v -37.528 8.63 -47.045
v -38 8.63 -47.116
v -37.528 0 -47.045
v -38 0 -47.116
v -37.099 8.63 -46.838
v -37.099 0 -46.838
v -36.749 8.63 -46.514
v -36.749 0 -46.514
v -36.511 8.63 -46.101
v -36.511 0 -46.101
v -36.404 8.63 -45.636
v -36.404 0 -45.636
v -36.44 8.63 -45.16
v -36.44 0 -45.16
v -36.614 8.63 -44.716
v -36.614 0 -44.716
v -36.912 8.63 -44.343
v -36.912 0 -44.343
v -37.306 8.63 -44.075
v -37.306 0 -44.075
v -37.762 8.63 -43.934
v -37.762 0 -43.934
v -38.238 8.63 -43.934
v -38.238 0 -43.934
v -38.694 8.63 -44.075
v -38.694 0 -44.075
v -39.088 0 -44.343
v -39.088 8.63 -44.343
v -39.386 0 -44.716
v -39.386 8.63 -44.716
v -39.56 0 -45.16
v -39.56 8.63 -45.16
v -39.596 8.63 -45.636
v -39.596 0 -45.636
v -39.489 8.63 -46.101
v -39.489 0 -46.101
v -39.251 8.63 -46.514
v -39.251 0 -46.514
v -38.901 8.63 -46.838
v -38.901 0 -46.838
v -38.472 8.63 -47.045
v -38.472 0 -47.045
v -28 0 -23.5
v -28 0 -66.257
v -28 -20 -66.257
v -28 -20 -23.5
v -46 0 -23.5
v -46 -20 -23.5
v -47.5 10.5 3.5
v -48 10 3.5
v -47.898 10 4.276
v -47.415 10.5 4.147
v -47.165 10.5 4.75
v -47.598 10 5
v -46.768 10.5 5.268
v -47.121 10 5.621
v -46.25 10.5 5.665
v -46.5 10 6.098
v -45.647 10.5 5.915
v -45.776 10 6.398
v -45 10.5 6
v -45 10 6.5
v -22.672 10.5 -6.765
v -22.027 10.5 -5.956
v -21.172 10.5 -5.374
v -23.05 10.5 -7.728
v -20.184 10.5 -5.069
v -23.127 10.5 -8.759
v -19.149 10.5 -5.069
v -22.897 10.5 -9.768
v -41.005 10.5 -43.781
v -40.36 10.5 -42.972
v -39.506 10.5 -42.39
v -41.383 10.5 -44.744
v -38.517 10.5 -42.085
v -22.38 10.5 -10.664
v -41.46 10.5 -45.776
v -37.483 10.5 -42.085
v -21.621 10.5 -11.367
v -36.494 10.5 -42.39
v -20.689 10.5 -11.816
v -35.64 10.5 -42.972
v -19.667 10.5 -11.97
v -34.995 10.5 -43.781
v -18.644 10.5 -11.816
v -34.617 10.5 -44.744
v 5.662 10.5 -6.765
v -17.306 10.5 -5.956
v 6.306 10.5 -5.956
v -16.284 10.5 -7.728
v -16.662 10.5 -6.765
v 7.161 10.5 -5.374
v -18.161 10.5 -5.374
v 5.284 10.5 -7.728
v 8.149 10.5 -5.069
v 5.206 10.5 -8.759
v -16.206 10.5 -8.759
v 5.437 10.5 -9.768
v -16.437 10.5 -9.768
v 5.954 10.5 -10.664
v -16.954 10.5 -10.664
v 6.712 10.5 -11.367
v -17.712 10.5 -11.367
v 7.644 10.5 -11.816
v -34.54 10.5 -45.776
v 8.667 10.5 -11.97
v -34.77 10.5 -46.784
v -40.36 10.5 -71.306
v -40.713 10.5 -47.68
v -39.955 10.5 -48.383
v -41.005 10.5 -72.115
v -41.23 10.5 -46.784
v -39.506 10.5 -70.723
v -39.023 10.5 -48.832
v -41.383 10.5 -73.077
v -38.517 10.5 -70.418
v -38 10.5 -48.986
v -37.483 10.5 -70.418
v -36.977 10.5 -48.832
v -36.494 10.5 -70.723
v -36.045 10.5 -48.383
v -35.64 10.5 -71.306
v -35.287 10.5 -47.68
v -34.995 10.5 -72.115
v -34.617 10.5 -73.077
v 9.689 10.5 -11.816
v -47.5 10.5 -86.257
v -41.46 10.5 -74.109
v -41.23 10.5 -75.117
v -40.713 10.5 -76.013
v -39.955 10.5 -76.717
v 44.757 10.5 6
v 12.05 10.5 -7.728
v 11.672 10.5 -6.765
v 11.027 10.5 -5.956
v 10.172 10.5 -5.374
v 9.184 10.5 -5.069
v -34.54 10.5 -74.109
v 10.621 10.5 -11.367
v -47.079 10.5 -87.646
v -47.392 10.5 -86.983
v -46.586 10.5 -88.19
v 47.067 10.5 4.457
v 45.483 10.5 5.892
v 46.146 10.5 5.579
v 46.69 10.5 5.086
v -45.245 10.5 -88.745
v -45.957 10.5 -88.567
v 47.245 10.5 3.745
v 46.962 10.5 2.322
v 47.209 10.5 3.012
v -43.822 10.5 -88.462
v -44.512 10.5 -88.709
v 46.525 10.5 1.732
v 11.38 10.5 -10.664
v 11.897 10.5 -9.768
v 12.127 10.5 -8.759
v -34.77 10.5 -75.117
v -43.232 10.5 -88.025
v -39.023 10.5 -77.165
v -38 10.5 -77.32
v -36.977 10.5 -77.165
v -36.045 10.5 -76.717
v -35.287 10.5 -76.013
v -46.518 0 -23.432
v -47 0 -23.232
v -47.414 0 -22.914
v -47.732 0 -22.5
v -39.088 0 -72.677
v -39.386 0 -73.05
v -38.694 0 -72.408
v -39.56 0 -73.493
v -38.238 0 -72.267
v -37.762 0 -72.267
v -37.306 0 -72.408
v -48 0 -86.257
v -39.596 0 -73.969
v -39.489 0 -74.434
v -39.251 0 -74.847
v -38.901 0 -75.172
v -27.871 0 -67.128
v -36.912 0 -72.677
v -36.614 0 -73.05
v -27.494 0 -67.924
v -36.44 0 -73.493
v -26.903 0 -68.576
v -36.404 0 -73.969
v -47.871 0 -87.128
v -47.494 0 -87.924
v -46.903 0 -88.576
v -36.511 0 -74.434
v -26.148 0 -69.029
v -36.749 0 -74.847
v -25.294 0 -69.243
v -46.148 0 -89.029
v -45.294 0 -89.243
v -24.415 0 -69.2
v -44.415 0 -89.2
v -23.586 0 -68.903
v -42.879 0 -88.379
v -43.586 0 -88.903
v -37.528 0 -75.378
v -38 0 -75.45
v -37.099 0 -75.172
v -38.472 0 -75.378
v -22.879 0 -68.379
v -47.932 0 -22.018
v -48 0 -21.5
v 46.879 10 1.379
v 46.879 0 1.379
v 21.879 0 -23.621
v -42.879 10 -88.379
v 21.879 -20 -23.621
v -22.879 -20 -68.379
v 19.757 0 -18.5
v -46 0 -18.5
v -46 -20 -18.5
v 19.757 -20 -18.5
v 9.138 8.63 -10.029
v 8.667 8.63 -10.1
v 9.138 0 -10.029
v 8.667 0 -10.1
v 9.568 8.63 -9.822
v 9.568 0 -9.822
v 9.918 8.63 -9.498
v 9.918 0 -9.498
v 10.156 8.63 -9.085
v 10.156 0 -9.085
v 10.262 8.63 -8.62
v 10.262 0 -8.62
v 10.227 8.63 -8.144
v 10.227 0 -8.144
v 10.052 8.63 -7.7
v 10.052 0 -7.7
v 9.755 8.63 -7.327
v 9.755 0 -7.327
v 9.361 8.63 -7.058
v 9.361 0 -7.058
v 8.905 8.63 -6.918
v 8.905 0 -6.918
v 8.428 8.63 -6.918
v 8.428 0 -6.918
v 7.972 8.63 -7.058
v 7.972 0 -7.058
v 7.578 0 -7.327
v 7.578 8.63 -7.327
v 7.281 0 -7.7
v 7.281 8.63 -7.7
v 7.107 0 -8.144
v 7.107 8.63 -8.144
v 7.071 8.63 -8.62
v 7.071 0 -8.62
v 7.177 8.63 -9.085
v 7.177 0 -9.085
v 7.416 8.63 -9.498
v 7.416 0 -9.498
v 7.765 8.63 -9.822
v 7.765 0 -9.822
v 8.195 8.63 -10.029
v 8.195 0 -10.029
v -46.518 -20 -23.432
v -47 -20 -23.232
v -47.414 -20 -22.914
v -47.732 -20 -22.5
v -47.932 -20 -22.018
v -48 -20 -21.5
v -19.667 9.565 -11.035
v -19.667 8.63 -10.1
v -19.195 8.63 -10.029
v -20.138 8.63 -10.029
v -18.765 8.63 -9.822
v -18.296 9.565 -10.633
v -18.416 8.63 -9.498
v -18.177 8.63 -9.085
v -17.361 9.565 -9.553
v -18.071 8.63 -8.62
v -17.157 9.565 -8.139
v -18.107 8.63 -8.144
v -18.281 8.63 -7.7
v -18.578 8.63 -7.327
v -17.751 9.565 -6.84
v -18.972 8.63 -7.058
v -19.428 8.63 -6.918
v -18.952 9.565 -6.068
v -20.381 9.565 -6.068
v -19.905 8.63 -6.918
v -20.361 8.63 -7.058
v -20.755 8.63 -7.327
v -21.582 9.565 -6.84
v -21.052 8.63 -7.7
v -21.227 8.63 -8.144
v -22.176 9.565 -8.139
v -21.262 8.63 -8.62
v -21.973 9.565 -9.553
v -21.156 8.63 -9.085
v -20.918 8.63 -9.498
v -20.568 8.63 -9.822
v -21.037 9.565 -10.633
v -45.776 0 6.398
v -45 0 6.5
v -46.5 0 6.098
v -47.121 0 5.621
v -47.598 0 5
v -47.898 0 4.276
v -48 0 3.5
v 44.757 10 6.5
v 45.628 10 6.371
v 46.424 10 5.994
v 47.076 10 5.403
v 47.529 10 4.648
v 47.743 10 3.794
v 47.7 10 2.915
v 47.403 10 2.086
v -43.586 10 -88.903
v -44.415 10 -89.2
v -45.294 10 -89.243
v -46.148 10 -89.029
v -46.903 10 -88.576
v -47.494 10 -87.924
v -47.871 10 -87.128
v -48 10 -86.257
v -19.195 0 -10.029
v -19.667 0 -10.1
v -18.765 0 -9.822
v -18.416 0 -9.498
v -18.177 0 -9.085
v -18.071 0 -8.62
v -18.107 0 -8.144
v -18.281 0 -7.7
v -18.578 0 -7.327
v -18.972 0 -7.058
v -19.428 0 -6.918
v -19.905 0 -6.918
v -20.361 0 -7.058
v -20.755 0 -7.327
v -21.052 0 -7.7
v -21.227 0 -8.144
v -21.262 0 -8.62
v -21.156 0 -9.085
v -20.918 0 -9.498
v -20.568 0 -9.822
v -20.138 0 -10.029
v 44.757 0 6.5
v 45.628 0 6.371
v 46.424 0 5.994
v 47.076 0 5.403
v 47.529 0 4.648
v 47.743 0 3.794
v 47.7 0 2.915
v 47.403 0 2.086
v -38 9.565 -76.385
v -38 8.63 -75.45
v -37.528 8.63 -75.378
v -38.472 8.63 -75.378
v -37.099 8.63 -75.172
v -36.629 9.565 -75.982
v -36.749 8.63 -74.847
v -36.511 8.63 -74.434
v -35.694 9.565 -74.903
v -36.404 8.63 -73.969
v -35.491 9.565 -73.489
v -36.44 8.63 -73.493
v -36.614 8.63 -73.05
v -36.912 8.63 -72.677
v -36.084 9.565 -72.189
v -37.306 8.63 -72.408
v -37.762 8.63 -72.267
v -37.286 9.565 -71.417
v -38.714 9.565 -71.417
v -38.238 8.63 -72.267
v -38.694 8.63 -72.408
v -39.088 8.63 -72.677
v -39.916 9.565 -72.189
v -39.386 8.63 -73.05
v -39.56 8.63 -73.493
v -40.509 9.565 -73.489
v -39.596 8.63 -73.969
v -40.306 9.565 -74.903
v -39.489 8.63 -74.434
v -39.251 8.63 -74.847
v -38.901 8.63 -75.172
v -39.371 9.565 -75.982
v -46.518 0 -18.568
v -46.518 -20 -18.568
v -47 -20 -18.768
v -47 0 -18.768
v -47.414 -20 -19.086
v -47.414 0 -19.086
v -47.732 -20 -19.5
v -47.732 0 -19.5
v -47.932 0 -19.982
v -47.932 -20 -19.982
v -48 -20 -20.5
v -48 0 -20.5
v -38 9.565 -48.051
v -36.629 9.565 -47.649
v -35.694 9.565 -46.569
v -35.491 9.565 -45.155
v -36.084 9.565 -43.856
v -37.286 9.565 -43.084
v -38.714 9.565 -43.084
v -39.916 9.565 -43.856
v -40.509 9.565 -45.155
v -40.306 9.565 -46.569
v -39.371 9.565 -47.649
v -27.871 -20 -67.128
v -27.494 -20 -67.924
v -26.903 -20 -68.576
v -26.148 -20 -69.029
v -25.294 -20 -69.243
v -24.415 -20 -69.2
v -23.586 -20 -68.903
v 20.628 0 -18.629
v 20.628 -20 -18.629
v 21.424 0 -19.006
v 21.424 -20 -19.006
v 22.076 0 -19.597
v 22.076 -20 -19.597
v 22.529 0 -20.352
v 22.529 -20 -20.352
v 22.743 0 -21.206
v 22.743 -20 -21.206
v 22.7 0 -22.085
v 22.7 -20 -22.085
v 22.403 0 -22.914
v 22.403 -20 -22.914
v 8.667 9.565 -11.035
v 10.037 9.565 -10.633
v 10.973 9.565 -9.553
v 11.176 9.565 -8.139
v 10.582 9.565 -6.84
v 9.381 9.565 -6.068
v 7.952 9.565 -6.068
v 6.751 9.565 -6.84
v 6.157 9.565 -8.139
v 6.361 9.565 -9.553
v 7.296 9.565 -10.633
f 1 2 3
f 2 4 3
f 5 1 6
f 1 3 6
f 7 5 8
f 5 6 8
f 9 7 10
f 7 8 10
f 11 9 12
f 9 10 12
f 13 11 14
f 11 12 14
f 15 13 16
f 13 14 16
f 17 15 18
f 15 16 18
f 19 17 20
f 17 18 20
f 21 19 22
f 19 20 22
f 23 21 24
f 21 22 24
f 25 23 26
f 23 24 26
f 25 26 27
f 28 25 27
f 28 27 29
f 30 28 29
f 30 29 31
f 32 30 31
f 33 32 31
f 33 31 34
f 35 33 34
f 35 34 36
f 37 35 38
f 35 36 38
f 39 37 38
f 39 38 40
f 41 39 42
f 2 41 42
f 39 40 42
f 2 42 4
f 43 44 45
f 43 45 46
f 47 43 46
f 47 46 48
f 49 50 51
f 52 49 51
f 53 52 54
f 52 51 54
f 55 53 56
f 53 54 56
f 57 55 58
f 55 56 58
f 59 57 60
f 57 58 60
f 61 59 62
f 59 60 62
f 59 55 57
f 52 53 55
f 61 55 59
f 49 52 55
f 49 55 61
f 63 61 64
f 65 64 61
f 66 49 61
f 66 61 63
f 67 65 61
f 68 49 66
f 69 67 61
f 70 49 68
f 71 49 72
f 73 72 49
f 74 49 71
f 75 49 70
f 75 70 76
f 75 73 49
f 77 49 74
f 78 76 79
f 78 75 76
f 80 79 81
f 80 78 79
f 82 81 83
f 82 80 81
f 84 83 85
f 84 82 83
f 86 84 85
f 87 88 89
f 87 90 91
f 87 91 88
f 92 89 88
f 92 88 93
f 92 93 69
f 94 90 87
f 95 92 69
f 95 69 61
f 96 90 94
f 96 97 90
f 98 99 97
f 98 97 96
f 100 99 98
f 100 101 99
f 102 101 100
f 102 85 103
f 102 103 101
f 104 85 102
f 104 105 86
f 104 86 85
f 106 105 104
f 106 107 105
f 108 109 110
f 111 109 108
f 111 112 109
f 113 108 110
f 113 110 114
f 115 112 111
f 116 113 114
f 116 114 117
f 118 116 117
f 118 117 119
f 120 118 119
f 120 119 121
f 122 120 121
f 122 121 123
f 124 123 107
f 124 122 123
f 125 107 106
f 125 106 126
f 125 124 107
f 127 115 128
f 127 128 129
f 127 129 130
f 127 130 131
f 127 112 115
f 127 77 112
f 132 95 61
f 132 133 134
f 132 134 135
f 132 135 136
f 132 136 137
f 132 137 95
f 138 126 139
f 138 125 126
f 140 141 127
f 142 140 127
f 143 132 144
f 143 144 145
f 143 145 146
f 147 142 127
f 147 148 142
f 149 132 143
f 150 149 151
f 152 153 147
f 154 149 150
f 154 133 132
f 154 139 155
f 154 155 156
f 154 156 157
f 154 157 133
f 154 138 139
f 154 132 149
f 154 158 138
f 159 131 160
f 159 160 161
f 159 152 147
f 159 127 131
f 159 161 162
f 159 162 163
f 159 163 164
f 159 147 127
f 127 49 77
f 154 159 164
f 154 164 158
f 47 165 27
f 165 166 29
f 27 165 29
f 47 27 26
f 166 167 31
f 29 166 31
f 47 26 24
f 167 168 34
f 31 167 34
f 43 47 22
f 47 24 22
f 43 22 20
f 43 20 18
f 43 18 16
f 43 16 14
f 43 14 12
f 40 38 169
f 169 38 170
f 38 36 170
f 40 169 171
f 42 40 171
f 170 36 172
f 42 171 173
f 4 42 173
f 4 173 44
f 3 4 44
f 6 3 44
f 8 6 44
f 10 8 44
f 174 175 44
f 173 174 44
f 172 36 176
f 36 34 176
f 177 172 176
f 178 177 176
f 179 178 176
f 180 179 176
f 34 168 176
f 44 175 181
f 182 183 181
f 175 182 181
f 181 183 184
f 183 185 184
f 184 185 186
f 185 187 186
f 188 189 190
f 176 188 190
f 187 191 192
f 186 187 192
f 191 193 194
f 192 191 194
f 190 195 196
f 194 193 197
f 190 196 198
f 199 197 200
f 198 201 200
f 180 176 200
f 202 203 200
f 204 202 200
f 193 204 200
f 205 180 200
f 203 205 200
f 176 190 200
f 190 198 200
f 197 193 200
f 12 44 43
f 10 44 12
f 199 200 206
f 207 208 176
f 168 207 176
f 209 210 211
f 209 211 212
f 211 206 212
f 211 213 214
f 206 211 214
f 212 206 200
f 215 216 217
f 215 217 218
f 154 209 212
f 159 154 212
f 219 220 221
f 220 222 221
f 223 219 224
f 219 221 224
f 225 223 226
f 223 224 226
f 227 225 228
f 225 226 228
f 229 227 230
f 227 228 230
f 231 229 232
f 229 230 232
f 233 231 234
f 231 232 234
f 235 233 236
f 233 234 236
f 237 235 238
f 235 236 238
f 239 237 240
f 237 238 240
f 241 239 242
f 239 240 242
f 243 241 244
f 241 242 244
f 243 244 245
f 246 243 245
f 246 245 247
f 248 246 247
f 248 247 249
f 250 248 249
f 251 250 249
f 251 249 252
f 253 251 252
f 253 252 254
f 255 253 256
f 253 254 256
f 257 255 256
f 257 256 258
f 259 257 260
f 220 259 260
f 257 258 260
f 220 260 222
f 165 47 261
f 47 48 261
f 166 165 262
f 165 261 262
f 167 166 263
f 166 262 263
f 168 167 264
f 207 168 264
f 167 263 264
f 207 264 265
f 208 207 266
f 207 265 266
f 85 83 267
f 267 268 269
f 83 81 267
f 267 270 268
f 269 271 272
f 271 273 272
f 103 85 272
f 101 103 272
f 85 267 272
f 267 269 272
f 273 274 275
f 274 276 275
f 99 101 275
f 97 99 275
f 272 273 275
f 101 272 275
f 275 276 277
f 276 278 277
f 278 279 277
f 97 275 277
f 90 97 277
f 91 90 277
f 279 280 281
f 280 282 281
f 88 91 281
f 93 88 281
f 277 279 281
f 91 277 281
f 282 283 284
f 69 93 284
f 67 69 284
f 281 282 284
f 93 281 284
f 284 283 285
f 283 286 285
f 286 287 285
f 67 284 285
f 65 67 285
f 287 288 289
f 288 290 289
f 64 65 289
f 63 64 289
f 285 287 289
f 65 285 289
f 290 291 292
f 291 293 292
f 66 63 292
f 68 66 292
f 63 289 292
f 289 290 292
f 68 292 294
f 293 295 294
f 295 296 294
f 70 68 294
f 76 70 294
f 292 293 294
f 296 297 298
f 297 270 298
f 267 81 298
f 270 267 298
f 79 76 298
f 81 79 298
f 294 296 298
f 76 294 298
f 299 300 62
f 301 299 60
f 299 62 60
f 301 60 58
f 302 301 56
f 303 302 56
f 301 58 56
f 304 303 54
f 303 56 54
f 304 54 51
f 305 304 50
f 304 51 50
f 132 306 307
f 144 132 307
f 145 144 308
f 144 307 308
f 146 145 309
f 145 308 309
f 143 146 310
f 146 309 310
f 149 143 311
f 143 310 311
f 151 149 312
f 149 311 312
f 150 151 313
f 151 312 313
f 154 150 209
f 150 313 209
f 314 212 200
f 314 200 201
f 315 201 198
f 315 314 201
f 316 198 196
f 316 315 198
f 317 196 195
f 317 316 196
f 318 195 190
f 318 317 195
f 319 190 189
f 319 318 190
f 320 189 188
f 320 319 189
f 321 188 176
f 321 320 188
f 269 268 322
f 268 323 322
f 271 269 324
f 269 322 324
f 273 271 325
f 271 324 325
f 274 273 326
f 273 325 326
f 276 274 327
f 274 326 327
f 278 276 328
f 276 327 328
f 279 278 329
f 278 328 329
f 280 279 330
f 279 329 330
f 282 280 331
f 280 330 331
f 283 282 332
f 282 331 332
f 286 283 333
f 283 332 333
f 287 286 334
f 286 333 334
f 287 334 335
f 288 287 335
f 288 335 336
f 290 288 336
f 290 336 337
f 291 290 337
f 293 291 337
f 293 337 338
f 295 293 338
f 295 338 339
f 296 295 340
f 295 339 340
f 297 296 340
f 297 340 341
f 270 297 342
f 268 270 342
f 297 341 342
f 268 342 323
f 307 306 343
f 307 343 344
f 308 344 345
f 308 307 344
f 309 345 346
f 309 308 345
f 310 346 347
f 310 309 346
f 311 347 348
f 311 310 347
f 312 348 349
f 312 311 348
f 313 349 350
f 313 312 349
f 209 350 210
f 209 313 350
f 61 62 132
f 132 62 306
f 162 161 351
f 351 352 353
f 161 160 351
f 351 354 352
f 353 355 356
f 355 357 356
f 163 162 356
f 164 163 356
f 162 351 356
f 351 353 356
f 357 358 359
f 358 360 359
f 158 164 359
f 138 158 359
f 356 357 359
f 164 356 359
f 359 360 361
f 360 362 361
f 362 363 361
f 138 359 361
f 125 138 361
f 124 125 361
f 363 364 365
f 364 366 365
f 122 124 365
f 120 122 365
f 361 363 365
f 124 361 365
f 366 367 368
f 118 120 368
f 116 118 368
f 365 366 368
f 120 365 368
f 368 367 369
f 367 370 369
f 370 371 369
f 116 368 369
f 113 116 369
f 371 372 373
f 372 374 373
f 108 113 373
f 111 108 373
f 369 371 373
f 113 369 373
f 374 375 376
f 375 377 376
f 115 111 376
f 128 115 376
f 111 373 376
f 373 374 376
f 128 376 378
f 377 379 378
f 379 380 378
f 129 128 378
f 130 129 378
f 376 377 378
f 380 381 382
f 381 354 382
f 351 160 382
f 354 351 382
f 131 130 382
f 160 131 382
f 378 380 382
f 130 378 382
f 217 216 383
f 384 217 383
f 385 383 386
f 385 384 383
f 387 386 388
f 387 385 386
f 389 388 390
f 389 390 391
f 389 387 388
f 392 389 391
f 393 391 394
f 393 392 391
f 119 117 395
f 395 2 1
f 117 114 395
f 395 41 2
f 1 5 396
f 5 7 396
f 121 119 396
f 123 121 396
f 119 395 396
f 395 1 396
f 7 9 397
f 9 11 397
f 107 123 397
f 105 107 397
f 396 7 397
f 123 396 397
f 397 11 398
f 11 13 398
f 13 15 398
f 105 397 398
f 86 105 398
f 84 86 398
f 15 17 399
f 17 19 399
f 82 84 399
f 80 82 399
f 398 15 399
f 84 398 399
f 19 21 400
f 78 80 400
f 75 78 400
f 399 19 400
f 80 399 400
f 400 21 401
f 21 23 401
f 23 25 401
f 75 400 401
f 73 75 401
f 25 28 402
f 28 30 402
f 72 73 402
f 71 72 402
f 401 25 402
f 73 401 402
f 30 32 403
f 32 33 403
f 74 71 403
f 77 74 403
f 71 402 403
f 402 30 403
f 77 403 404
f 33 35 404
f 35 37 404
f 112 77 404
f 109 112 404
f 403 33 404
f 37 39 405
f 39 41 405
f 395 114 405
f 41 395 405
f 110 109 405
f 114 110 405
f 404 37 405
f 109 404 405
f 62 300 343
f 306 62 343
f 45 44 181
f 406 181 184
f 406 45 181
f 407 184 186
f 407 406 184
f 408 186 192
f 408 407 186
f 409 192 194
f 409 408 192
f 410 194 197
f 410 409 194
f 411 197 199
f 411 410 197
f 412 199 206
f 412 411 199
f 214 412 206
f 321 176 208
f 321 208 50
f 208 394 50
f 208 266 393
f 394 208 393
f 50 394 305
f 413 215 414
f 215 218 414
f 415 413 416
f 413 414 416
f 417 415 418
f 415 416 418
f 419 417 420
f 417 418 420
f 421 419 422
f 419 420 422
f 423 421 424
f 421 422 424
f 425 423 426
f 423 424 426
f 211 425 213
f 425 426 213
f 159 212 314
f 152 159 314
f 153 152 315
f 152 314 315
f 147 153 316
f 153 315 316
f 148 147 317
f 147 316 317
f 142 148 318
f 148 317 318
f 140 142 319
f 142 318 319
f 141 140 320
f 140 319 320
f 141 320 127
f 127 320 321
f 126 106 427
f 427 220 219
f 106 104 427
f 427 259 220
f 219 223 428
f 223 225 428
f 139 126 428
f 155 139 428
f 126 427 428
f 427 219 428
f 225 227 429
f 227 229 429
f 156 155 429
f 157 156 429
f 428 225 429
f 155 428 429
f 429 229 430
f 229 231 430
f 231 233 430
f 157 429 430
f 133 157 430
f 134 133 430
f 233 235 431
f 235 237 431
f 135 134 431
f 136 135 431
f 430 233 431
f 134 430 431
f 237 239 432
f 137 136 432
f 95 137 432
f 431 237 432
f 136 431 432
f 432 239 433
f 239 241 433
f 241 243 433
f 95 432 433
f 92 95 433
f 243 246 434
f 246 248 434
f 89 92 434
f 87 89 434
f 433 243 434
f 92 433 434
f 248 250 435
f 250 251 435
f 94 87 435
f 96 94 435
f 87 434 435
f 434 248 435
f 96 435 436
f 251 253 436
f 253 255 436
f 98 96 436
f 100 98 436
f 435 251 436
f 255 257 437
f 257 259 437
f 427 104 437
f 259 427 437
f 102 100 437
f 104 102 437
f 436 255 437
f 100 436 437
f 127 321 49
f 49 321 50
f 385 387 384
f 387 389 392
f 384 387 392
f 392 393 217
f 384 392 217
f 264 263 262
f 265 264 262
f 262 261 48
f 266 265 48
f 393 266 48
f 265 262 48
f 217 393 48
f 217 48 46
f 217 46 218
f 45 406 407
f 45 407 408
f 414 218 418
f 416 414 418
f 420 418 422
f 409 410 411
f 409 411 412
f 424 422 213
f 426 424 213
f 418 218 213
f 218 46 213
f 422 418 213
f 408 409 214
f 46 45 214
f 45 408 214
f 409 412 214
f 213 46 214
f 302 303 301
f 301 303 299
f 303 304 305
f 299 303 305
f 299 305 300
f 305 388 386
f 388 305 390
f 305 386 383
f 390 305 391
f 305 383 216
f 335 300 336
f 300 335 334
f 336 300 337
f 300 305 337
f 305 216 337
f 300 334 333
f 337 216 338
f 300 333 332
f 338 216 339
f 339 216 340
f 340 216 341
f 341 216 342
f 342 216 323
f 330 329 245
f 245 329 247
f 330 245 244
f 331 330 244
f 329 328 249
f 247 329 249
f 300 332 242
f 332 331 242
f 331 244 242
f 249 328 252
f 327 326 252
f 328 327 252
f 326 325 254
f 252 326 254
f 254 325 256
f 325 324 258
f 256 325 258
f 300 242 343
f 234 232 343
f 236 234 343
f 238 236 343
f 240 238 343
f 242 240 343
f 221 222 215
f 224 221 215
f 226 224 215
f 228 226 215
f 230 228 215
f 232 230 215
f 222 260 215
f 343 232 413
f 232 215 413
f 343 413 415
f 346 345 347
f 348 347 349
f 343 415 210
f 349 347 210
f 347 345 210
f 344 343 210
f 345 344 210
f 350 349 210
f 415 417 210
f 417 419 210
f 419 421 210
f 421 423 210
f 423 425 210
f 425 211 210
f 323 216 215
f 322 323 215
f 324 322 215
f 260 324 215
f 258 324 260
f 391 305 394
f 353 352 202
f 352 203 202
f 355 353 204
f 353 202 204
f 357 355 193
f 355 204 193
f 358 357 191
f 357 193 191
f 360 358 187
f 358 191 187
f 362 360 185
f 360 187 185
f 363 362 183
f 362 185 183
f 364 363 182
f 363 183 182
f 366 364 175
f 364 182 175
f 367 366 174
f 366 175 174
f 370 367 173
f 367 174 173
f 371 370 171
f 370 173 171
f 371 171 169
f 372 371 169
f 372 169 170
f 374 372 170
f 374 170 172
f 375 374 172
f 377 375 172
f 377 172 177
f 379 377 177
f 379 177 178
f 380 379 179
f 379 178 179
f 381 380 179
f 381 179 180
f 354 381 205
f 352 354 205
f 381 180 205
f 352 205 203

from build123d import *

# Parameters (mm, degrees)
SKETCH1_R                                            = 1
MAIN_BODY_DEPTH                                      = 10.5
PROFILE_STOPS_DEPTH                                  = 20
CSK_FOR_M3_HEX_SOCKET_COUNTERSUNK_HEAD_S_D           = 3.2
CSK_FOR_M3_HEX_SOCKET_COUNTERSUNK_HEAD_S_DEPTH       = 30.5
CSK_FOR_M3_HEX_SOCKET_COUNTERSUNK_HEAD_S_CSINK_D     = 6.94
CSK_FOR_M3_HEX_SOCKET_COUNTERSUNK_HEAD_S_CSINK_ANGLE = 90
FILLET1_R                                            = 3
FILLET3_R                                            = 2
CHAMFER1_SIZE                                        = 0.5


with BuildPart() as part:
    # Sketch1 → Main Body (new body)
    with BuildSketch(Plane(origin=(0, 0, 0), x_dir=(1, 0, 0), z_dir=(0, 1, 0))):
        Polygon((-48, -6.5), (52, -6.5), (-48, 93.5), align=None)
        with Locations((-19.666666667, 8.5)):
            Circle(SKETCH1_R, mode=Mode.SUBTRACT)
        with Locations((8.666666667, 8.5)):
            Circle(SKETCH1_R, mode=Mode.SUBTRACT)
        with Locations((-38, 45.516187598)):
            Circle(SKETCH1_R, mode=Mode.SUBTRACT)
        with Locations((-38, 73.849520931)):
            Circle(SKETCH1_R, mode=Mode.SUBTRACT)
    extrude(amount=MAIN_BODY_DEPTH)

    # Sketch1_3 → Profile Stops (add)
    with BuildSketch(Plane(origin=(0, 0, 0), x_dir=(1, 0, 0), z_dir=(0, 1, 0))):
        Polygon((-48, 23.5), (-48, 18.5), (27, 18.5), (-28, 73.5), (-28, 23.5), (-41, 23.5), align=None)
    extrude(amount=-PROFILE_STOPS_DEPTH)

    # CSK for M3 Hex Socket Countersunk Head S
    with Locations(Plane(origin=(-38, 10.5, -73.849520931), x_dir=(0, 0, 1), z_dir=(0, 1, 0))):
        with Locations((0, 0), (28.333333333, 0), (65.349520931, 46.666666667), (65.349520931, 18.333333333)):
            CounterSinkHole(CSK_FOR_M3_HEX_SOCKET_COUNTERSUNK_HEAD_S_D / 2, CSK_FOR_M3_HEX_SOCKET_COUNTERSUNK_HEAD_S_CSINK_D / 2, depth=CSK_FOR_M3_HEX_SOCKET_COUNTERSUNK_HEAD_S_DEPTH, counter_sink_angle=CSK_FOR_M3_HEX_SOCKET_COUNTERSUNK_HEAD_S_CSINK_ANGLE)

    # Fillet1
    fillet1_edges = [part.edges().sort_by_distance(p)[0] for p in [
        (-48, 5.25, 6.5),
        (52, 5.25, 6.5),
        (-28, -10, -73.5),
        (27, -10, -18.5),
        (-48, 5.25, -93.5),
    ]]
    fillet(fillet1_edges, radius=FILLET1_R)

    # Fillet3
    fillet3_edges = [part.edges().sort_by_distance(p)[0] for p in [
        (-48, -10, -23.5),
        (-48, -10, -18.5),
    ]]
    fillet(fillet3_edges, radius=FILLET3_R)

    # Chamfer1
    chamfer1_edges = [part.edges().sort_by_distance(p)[0] for p in [
        (-48, 10.5, -41.378679656),
        (2, 10.5, -43.5),
        (-47.121320344, 10.5, 5.621320344),
        (47.52899791, 10.5, 4.648050297),
        (-0.121320344, 10.5, 6.5),
        (-46.148050297, 10.5, -89.02899791),
    ]]
    chamfer(chamfer1_edges, length=CHAMFER1_SIZE)


solid = part.part
